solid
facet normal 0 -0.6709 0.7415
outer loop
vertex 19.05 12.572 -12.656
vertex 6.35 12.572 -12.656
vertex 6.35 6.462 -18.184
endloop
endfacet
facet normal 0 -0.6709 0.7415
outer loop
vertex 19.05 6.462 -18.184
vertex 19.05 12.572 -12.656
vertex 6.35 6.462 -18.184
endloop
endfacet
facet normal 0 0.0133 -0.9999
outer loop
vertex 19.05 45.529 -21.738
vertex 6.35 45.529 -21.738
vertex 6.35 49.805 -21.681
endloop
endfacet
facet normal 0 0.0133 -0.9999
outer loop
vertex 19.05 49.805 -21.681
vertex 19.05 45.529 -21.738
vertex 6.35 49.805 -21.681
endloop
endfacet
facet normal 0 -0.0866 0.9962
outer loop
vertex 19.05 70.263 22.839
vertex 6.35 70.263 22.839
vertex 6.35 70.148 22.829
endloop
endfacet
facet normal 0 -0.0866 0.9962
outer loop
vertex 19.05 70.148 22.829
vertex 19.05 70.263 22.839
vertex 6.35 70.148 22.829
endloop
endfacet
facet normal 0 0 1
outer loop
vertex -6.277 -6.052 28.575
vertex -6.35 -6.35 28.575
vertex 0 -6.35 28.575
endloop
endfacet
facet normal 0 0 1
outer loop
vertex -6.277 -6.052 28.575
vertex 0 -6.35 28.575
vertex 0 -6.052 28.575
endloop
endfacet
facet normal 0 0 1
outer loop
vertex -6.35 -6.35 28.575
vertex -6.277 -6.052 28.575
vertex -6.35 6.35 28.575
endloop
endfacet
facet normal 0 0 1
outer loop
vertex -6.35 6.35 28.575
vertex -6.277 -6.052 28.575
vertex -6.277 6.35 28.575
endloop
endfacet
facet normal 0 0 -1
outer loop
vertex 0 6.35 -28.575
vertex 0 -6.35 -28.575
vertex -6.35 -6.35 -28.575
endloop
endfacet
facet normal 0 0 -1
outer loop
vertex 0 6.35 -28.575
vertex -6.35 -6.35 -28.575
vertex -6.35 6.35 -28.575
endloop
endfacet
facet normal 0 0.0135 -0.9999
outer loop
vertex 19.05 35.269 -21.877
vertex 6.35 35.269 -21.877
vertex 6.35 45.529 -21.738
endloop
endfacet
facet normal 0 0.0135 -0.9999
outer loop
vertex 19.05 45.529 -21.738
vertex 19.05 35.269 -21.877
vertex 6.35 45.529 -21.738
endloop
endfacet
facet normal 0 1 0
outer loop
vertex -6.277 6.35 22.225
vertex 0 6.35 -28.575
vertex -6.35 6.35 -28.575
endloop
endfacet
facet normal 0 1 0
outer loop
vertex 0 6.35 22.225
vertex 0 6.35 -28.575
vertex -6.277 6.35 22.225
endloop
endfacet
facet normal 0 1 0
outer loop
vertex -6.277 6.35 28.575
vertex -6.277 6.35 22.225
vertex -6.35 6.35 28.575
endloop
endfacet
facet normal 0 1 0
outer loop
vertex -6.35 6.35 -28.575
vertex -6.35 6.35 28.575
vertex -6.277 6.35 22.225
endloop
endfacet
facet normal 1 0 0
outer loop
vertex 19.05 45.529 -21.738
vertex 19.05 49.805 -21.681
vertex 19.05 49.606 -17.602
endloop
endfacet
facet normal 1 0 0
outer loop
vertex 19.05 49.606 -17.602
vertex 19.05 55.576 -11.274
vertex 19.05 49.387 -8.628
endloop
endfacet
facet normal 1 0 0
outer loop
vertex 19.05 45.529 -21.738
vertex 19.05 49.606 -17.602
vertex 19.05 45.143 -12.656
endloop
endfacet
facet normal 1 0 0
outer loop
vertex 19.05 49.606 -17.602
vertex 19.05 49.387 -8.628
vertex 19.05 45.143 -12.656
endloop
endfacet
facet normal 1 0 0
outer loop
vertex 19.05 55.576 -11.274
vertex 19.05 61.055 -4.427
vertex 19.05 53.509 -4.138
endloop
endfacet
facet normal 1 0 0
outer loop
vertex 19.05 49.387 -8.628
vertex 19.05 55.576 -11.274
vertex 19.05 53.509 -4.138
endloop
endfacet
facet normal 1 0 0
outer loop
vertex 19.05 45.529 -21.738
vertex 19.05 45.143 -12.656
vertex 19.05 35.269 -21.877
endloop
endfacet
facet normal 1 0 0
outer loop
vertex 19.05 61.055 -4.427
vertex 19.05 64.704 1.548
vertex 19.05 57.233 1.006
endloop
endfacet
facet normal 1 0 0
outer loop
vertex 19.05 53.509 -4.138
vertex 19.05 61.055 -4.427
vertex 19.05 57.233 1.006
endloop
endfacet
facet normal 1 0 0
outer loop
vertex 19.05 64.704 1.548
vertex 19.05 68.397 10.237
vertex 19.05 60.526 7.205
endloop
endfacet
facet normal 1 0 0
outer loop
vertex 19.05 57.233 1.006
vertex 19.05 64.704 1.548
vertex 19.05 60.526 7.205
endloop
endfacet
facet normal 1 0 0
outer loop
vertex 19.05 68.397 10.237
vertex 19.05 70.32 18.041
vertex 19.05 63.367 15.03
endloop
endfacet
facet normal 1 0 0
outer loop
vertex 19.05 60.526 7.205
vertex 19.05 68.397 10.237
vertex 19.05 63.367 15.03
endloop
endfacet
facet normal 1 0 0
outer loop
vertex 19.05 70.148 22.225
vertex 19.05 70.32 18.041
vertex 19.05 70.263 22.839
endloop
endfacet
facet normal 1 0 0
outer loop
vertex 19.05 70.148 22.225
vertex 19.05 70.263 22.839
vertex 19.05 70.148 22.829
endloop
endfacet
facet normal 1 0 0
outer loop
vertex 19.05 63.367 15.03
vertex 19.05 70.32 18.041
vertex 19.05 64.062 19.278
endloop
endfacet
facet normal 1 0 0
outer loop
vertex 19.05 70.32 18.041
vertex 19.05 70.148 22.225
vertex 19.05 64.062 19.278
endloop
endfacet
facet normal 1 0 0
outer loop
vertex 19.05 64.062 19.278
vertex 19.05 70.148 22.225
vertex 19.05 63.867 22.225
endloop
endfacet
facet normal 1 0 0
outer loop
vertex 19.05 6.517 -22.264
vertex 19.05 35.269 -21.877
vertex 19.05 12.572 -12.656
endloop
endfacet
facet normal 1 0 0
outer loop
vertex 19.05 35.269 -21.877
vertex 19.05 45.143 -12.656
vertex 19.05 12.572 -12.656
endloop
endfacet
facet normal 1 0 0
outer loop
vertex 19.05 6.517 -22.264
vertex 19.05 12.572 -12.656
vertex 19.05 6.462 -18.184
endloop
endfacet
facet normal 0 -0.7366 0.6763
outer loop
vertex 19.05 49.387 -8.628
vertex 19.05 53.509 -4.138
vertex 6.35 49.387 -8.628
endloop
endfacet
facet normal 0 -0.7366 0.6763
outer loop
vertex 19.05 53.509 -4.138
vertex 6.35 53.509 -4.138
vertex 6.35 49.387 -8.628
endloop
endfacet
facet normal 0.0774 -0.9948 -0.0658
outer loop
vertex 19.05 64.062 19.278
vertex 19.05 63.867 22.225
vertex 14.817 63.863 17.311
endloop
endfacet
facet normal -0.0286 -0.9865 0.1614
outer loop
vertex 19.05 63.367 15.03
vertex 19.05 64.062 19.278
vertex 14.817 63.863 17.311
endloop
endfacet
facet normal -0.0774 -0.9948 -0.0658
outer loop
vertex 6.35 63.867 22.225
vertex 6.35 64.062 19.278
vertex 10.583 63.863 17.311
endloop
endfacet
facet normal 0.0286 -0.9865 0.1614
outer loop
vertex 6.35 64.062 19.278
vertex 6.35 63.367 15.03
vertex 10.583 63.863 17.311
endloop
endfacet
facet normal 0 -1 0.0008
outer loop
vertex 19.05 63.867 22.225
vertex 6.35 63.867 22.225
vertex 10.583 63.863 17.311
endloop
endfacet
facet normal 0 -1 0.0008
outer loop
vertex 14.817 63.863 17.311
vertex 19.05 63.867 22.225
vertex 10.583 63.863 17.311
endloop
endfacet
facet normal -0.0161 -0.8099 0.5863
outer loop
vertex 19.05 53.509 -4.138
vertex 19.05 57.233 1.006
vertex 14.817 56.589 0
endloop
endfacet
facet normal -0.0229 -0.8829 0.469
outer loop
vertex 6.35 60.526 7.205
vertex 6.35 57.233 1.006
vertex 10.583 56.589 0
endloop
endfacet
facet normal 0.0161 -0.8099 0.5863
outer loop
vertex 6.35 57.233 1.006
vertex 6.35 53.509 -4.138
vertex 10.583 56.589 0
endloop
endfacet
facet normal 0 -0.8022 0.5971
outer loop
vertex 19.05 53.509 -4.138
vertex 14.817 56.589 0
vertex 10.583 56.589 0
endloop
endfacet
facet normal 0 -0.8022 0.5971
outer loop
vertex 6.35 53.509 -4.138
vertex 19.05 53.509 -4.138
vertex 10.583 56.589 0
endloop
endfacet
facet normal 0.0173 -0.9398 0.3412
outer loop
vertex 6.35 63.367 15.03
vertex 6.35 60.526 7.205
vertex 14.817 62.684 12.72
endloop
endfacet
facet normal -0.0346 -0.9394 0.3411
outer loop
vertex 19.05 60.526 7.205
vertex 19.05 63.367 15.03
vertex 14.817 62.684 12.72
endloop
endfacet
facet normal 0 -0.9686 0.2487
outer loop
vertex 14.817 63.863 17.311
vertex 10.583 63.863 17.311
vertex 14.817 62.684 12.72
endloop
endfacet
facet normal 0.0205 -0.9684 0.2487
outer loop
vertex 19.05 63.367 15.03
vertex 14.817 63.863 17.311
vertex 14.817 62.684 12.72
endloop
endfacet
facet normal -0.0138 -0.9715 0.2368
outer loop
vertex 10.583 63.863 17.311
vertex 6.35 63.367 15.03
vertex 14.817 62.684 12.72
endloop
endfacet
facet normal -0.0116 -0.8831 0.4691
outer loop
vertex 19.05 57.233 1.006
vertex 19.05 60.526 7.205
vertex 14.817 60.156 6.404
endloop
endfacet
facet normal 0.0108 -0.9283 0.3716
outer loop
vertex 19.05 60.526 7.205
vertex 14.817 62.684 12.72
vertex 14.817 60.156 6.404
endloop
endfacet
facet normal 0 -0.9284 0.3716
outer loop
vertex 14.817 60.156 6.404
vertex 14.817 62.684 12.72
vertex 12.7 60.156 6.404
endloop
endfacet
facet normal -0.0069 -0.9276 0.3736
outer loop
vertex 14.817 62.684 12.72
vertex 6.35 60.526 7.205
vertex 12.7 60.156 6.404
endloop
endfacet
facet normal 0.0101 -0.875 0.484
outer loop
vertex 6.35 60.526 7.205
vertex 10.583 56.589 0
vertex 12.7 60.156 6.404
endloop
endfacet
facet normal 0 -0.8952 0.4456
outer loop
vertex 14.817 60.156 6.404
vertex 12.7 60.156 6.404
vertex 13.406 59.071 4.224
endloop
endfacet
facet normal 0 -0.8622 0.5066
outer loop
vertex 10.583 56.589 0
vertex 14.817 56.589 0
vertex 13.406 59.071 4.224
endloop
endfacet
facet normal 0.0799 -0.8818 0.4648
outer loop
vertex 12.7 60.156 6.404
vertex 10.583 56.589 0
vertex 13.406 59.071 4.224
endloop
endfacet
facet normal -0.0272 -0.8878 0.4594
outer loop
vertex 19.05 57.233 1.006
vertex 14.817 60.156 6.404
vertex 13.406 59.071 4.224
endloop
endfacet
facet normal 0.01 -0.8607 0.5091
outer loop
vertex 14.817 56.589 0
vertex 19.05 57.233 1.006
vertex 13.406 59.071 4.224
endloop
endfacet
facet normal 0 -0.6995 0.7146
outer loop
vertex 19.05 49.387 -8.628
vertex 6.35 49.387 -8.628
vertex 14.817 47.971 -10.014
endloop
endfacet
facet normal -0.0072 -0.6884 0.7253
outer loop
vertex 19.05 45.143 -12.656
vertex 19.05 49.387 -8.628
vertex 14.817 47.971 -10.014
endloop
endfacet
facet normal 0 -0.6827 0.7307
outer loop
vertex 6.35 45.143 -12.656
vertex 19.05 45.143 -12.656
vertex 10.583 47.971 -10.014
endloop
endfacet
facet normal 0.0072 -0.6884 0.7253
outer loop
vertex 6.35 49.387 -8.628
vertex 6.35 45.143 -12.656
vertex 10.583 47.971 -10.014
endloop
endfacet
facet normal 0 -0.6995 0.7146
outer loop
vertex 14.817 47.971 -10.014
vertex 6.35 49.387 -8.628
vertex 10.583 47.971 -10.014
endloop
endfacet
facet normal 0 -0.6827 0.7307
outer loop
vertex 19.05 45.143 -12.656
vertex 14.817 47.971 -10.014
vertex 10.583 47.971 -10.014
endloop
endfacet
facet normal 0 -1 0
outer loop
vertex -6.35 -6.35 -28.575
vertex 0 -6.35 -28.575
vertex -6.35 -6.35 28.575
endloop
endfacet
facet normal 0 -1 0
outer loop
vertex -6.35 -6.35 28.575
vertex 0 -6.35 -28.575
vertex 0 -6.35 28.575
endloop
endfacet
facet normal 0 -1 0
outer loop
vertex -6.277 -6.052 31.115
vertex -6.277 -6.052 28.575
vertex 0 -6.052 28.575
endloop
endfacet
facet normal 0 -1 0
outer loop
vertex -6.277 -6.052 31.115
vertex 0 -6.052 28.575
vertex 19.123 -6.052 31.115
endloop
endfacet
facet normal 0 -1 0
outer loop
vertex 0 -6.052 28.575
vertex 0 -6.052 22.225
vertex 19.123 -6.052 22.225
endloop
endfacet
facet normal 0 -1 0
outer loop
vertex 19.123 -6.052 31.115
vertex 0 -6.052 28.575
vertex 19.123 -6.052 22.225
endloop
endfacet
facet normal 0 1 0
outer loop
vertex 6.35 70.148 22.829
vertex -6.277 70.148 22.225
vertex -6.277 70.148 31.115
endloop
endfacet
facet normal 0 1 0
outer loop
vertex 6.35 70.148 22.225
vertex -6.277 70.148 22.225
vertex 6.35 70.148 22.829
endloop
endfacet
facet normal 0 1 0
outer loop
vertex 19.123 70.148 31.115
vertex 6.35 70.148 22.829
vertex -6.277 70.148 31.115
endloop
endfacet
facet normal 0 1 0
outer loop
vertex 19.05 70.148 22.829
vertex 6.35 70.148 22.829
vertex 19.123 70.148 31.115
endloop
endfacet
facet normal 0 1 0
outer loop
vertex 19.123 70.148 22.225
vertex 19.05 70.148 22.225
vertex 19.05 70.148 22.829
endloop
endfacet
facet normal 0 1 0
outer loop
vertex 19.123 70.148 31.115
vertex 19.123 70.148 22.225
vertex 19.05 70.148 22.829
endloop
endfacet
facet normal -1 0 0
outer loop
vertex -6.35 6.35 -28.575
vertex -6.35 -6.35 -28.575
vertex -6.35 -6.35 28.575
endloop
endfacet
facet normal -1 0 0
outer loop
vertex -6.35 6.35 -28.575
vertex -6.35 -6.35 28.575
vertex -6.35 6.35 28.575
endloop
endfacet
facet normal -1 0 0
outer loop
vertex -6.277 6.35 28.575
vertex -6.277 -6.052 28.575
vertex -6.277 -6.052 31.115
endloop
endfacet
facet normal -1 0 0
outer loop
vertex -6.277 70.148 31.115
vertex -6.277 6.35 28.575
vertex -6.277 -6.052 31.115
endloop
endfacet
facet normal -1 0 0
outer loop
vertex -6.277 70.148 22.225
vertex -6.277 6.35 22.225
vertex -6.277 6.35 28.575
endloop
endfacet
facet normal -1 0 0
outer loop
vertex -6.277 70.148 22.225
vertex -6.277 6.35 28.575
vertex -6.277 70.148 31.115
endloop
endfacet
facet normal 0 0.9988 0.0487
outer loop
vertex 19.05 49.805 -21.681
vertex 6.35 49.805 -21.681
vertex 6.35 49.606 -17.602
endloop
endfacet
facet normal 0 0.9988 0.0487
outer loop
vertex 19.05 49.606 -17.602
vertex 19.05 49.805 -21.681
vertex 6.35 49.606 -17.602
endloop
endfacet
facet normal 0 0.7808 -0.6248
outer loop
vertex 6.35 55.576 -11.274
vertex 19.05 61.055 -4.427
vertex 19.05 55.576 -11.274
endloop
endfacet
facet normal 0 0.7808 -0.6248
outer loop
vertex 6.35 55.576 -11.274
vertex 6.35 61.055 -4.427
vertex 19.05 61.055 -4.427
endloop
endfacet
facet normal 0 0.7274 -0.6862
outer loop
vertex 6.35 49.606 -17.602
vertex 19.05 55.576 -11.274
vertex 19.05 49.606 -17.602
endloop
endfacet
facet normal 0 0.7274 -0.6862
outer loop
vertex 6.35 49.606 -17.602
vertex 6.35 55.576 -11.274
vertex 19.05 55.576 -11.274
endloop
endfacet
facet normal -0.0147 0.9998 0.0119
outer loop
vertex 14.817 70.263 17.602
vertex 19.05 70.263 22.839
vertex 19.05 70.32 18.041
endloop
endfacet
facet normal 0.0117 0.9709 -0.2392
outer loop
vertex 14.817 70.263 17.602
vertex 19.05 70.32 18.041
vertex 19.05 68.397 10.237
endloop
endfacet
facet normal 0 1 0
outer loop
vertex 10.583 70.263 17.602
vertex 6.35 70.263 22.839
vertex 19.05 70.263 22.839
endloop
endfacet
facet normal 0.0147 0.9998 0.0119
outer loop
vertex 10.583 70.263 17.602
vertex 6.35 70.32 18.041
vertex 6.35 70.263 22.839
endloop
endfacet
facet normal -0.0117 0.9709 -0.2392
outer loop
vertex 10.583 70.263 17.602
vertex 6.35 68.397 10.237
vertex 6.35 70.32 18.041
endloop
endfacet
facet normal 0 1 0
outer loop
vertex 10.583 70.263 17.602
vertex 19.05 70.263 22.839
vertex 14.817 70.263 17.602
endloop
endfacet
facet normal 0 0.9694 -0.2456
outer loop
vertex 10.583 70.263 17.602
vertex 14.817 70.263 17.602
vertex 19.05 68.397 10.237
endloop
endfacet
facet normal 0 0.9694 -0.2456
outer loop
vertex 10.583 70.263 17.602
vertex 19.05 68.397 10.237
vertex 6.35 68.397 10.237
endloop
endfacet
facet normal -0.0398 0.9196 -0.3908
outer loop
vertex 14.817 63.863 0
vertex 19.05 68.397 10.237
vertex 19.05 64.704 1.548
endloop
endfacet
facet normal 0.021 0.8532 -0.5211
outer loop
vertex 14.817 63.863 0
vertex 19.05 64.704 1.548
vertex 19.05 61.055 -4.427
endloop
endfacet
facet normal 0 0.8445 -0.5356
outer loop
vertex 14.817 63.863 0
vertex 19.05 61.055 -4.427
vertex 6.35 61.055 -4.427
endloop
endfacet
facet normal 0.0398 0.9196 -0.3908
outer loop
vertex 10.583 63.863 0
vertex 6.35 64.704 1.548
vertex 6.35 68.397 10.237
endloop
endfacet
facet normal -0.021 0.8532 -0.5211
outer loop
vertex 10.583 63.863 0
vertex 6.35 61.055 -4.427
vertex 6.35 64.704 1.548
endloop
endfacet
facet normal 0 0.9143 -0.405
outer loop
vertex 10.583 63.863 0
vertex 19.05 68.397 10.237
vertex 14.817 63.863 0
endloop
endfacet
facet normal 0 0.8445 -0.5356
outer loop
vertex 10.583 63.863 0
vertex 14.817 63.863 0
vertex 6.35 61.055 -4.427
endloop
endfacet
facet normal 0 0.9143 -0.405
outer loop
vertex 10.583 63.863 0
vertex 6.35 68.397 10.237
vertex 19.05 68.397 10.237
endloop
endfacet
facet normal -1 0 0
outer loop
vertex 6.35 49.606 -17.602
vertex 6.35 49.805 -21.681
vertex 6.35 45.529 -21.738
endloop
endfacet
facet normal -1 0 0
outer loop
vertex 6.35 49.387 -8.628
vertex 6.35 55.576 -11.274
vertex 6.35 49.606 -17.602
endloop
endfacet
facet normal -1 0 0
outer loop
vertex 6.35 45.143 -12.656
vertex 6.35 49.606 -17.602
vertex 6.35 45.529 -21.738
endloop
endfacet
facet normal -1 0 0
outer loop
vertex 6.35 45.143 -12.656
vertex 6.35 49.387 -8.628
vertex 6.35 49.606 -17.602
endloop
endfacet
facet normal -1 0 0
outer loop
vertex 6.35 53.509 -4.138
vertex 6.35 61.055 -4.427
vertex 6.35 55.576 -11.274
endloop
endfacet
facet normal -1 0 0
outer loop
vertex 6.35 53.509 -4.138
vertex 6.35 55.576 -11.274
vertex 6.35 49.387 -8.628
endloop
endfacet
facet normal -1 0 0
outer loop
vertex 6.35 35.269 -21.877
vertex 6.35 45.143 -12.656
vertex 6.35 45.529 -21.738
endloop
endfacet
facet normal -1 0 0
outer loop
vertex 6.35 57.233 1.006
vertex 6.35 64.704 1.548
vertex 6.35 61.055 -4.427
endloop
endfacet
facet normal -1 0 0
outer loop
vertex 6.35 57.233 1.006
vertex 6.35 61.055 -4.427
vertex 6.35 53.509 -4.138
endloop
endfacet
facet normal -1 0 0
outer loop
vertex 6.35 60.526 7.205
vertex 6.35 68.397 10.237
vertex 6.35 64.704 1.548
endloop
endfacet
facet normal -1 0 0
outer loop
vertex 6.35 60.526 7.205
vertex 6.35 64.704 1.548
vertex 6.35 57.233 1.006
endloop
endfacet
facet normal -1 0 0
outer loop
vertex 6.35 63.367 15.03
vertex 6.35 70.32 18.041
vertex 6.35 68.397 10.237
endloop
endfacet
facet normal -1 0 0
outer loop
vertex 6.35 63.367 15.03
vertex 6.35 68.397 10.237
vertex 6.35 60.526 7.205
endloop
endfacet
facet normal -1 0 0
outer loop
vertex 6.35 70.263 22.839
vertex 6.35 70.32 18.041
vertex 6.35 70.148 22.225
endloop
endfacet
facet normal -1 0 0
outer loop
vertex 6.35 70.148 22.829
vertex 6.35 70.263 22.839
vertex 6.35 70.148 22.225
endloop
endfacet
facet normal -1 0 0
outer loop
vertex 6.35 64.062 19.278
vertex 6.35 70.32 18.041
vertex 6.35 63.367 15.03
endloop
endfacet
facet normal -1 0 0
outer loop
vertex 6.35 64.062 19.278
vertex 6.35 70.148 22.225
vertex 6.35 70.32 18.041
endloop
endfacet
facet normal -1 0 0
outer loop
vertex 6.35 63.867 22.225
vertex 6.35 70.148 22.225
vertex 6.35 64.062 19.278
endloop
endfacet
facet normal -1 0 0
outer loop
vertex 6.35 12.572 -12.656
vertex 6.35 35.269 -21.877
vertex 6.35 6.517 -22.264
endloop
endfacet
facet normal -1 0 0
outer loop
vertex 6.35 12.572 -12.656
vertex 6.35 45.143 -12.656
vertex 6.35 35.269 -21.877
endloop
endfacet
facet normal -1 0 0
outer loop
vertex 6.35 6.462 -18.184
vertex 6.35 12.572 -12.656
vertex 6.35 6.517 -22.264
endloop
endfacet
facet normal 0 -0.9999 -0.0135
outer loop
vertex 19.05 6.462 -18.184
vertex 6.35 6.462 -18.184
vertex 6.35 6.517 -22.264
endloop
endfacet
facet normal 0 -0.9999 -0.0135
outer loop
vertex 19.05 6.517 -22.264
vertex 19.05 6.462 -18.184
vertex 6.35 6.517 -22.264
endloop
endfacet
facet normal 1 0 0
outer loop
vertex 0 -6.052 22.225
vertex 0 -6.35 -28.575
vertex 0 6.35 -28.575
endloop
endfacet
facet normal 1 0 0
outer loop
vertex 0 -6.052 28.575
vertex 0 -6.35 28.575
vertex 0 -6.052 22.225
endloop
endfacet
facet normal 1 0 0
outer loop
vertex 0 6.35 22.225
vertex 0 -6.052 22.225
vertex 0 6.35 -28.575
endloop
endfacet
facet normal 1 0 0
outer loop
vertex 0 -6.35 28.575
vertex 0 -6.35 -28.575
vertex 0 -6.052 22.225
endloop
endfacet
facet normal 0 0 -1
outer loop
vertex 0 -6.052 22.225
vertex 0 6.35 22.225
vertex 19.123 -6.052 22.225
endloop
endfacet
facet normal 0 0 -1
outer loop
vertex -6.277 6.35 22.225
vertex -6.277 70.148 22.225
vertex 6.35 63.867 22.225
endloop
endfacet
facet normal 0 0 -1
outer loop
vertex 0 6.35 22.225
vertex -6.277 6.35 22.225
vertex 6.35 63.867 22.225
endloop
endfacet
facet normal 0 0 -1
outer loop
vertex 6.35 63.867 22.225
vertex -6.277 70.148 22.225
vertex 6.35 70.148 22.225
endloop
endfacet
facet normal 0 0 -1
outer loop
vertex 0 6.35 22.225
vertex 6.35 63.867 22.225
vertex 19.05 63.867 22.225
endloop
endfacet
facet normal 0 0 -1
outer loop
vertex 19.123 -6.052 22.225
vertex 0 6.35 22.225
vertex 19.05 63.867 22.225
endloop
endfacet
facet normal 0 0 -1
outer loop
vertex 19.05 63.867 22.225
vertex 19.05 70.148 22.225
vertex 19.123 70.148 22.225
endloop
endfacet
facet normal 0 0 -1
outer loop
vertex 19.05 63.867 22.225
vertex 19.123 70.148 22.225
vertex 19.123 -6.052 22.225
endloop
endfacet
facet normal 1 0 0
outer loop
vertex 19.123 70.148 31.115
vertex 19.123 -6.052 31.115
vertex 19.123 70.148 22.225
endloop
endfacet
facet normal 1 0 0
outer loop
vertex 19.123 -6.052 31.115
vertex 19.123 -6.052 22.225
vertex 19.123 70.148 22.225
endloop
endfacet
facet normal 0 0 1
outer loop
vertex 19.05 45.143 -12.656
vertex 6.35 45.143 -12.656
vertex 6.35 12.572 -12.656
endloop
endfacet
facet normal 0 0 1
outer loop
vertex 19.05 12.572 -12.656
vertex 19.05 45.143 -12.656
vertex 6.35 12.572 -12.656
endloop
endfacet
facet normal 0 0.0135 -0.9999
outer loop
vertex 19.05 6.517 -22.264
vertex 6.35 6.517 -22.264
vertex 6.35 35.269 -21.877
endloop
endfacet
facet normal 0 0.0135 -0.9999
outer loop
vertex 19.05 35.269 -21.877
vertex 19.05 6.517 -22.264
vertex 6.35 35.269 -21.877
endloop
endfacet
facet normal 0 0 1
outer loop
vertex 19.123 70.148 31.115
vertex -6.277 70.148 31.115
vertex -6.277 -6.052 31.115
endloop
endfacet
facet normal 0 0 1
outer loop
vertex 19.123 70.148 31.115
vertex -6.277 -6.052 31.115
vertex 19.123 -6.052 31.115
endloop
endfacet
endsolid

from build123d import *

# Parameters (mm, degrees)
F0_W          = 12.7
F0_H          = 57.15
F1_DEPTH      = 6.35
F3_W          = 25.4
F3_H          = 76.2
F4_DEPTH      = 6.35
F4_DEPTH_BACK = 2.54
F7_DEPTH      = 12.7


with BuildPart() as f1:
    # F0 (on Right) → F1 (new body)
    with BuildSketch(Plane.YZ):
        Rectangle(F0_W, F0_H)
    extrude(amount=-F1_DEPTH)

    # F3 (on offset) → F4 (join, two sides)
    with BuildSketch(Plane.XY.offset(28.575)) as f4_sk:
        with Locations((6.4234920739, 32.0478732836)):
            Rectangle(F3_W, F3_H)
    extrude(amount=-F4_DEPTH)
    extrude(f4_sk.sketch, amount=F4_DEPTH_BACK)

    # F6 (on offset) → F7 (join)
    with BuildSketch(Plane.YZ.offset(6.35)):
        with BuildLine():
            add(Edge.make_bspline(
                [(70.2633336186, 22.8392183781), (70.4233882553, 21.3594202626), (70.8861297069, 17.0811066655), (64.7810650809, -1.7378247981), (54.8334581019, -12.2566322998), (49.6061965824, -17.6021996762)],
                knots=[0, 0, 0, 0, 0.1426234456, 0.4123453195, 0.7089617498, 0.7089617498, 0.7089617498, 0.7089617498], degree=3))
            Line((70.2633336186, 22.8392183781), (63.8625249267, 22.2573280334))
            add(Edge.make_bspline(
                [(63.8625249267, 22.2573280334), (64.0412796019, 20.8723429335), (64.5683260106, 16.7888054132), (58.9062733043, 1.7794154409), (51.9438558064, -6.0723920348), (49.3872103067, -8.6279157552)],
                knots=[0, 0, 0, 0, 0.1493923045, 0.440473389, 0.6031634486, 0.6031634486, 0.6031634486, 0.6031634486], degree=3))
            add(Edge.make_bspline(
                [(49.3872103067, -8.6279157552), (47.9749044151, -10.0396019693), (46.5441619109, -11.3720779909), (45.1433620447, -12.6561271027)],
                knots=[0.6031634486, 0.6031634486, 0.6031634486, 0.6031634486, 0.6930343867, 0.6930343867, 0.6930343867, 0.6930343867], degree=3))
            add(Edge.make_bspline(
                [(45.1433620447, -12.6561271027), (44.389197075, -13.3474356064), (42.4890896803, -15.0736774227), (40.6944116755, -16.7399375724), (39.6315032844, -17.7367295919)],
                knots=[0.6930343867, 0.6930343867, 0.6930343867, 0.6930343867, 0.7414192524, 0.8163585632, 0.8163585632, 0.8163585632, 0.8163585632], degree=3))
            Line((39.6315032844, -17.7367295919), (49.6061965824, -17.6021996762))
        make_face()
        with BuildLine():
            Line((49.8050153623, -21.68060241), (49.6061965824, -17.6021996762))
            add(Edge.make_bspline(
                [(49.6061965824, -17.6021996762), (48.2481731115, -18.9909585771), (46.8889847211, -20.3686756001), (45.5289398536, -21.7382743664)],
                knots=[0.7089617498, 0.7089617498, 0.7089617498, 0.7089617498, 0.7860216162, 0.7860216162, 0.7860216162, 0.7860216162], degree=3))
            Line((45.5289398536, -21.7382743664), (49.8050153623, -21.68060241))
        make_face()
        with BuildLine():
            add(Edge.make_bspline(
                [(49.6061965824, -17.6021996762), (48.2481731115, -18.9909585771), (46.8889847211, -20.3686756001), (45.5289398536, -21.7382743664)],
                knots=[0.7089617498, 0.7089617498, 0.7089617498, 0.7089617498, 0.7860216162, 0.7860216162, 0.7860216162, 0.7860216162], degree=3))
            Line((49.6061965824, -17.6021996762), (39.6315032844, -17.7367295919))
            add(Edge.make_bspline(
                [(39.6315032844, -17.7367295919), (38.1330562509, -19.1419683285), (36.6895570101, -20.5159457613), (35.2693948102, -21.8766461126)],
                knots=[0.8163585632, 0.8163585632, 0.8163585632, 0.8163585632, 0.9220050976, 0.9220050976, 0.9220050976, 0.9220050976], degree=3))
            Line((35.2693948102, -21.8766461126), (45.5289398536, -21.7382743664))
        make_face()
        with BuildLine():
            Line((6.4619160257, -18.1840918958), (39.6315032844, -17.7367295919))
            add(Edge.make_bspline(
                [(45.1433620447, -12.6561271027), (44.389197075, -13.3474356064), (42.4890896803, -15.0736774227), (40.6944116755, -16.7399375724), (39.6315032844, -17.7367295919)],
                knots=[0.6930343867, 0.6930343867, 0.6930343867, 0.6930343867, 0.7414192524, 0.8163585632, 0.8163585632, 0.8163585632, 0.8163585632], degree=3))
            Line((45.1433620447, -12.6561271027), (12.5717725605, -12.6561271027))
            Line((12.5717725605, -12.6561271027), (6.4619160257, -18.1840918958))
        make_face()
        with BuildLine():
            add(Edge.make_bspline(
                [(39.6315032844, -17.7367295919), (38.1330562509, -19.1419683285), (36.6895570101, -20.5159457613), (35.2693948102, -21.8766461126)],
                knots=[0.8163585632, 0.8163585632, 0.8163585632, 0.8163585632, 0.9220050976, 0.9220050976, 0.9220050976, 0.9220050976], degree=3))
            Line((39.6315032844, -17.7367295919), (6.4619160257, -18.1840918958))
            Line((6.4619160257, -18.1840918958), (6.5169481003, -22.2644338986))
            Line((6.5169481003, -22.2644338986), (35.2693948102, -21.8766461126))
        make_face()
    extrude(amount=F7_DEPTH)


solid = f1.part
